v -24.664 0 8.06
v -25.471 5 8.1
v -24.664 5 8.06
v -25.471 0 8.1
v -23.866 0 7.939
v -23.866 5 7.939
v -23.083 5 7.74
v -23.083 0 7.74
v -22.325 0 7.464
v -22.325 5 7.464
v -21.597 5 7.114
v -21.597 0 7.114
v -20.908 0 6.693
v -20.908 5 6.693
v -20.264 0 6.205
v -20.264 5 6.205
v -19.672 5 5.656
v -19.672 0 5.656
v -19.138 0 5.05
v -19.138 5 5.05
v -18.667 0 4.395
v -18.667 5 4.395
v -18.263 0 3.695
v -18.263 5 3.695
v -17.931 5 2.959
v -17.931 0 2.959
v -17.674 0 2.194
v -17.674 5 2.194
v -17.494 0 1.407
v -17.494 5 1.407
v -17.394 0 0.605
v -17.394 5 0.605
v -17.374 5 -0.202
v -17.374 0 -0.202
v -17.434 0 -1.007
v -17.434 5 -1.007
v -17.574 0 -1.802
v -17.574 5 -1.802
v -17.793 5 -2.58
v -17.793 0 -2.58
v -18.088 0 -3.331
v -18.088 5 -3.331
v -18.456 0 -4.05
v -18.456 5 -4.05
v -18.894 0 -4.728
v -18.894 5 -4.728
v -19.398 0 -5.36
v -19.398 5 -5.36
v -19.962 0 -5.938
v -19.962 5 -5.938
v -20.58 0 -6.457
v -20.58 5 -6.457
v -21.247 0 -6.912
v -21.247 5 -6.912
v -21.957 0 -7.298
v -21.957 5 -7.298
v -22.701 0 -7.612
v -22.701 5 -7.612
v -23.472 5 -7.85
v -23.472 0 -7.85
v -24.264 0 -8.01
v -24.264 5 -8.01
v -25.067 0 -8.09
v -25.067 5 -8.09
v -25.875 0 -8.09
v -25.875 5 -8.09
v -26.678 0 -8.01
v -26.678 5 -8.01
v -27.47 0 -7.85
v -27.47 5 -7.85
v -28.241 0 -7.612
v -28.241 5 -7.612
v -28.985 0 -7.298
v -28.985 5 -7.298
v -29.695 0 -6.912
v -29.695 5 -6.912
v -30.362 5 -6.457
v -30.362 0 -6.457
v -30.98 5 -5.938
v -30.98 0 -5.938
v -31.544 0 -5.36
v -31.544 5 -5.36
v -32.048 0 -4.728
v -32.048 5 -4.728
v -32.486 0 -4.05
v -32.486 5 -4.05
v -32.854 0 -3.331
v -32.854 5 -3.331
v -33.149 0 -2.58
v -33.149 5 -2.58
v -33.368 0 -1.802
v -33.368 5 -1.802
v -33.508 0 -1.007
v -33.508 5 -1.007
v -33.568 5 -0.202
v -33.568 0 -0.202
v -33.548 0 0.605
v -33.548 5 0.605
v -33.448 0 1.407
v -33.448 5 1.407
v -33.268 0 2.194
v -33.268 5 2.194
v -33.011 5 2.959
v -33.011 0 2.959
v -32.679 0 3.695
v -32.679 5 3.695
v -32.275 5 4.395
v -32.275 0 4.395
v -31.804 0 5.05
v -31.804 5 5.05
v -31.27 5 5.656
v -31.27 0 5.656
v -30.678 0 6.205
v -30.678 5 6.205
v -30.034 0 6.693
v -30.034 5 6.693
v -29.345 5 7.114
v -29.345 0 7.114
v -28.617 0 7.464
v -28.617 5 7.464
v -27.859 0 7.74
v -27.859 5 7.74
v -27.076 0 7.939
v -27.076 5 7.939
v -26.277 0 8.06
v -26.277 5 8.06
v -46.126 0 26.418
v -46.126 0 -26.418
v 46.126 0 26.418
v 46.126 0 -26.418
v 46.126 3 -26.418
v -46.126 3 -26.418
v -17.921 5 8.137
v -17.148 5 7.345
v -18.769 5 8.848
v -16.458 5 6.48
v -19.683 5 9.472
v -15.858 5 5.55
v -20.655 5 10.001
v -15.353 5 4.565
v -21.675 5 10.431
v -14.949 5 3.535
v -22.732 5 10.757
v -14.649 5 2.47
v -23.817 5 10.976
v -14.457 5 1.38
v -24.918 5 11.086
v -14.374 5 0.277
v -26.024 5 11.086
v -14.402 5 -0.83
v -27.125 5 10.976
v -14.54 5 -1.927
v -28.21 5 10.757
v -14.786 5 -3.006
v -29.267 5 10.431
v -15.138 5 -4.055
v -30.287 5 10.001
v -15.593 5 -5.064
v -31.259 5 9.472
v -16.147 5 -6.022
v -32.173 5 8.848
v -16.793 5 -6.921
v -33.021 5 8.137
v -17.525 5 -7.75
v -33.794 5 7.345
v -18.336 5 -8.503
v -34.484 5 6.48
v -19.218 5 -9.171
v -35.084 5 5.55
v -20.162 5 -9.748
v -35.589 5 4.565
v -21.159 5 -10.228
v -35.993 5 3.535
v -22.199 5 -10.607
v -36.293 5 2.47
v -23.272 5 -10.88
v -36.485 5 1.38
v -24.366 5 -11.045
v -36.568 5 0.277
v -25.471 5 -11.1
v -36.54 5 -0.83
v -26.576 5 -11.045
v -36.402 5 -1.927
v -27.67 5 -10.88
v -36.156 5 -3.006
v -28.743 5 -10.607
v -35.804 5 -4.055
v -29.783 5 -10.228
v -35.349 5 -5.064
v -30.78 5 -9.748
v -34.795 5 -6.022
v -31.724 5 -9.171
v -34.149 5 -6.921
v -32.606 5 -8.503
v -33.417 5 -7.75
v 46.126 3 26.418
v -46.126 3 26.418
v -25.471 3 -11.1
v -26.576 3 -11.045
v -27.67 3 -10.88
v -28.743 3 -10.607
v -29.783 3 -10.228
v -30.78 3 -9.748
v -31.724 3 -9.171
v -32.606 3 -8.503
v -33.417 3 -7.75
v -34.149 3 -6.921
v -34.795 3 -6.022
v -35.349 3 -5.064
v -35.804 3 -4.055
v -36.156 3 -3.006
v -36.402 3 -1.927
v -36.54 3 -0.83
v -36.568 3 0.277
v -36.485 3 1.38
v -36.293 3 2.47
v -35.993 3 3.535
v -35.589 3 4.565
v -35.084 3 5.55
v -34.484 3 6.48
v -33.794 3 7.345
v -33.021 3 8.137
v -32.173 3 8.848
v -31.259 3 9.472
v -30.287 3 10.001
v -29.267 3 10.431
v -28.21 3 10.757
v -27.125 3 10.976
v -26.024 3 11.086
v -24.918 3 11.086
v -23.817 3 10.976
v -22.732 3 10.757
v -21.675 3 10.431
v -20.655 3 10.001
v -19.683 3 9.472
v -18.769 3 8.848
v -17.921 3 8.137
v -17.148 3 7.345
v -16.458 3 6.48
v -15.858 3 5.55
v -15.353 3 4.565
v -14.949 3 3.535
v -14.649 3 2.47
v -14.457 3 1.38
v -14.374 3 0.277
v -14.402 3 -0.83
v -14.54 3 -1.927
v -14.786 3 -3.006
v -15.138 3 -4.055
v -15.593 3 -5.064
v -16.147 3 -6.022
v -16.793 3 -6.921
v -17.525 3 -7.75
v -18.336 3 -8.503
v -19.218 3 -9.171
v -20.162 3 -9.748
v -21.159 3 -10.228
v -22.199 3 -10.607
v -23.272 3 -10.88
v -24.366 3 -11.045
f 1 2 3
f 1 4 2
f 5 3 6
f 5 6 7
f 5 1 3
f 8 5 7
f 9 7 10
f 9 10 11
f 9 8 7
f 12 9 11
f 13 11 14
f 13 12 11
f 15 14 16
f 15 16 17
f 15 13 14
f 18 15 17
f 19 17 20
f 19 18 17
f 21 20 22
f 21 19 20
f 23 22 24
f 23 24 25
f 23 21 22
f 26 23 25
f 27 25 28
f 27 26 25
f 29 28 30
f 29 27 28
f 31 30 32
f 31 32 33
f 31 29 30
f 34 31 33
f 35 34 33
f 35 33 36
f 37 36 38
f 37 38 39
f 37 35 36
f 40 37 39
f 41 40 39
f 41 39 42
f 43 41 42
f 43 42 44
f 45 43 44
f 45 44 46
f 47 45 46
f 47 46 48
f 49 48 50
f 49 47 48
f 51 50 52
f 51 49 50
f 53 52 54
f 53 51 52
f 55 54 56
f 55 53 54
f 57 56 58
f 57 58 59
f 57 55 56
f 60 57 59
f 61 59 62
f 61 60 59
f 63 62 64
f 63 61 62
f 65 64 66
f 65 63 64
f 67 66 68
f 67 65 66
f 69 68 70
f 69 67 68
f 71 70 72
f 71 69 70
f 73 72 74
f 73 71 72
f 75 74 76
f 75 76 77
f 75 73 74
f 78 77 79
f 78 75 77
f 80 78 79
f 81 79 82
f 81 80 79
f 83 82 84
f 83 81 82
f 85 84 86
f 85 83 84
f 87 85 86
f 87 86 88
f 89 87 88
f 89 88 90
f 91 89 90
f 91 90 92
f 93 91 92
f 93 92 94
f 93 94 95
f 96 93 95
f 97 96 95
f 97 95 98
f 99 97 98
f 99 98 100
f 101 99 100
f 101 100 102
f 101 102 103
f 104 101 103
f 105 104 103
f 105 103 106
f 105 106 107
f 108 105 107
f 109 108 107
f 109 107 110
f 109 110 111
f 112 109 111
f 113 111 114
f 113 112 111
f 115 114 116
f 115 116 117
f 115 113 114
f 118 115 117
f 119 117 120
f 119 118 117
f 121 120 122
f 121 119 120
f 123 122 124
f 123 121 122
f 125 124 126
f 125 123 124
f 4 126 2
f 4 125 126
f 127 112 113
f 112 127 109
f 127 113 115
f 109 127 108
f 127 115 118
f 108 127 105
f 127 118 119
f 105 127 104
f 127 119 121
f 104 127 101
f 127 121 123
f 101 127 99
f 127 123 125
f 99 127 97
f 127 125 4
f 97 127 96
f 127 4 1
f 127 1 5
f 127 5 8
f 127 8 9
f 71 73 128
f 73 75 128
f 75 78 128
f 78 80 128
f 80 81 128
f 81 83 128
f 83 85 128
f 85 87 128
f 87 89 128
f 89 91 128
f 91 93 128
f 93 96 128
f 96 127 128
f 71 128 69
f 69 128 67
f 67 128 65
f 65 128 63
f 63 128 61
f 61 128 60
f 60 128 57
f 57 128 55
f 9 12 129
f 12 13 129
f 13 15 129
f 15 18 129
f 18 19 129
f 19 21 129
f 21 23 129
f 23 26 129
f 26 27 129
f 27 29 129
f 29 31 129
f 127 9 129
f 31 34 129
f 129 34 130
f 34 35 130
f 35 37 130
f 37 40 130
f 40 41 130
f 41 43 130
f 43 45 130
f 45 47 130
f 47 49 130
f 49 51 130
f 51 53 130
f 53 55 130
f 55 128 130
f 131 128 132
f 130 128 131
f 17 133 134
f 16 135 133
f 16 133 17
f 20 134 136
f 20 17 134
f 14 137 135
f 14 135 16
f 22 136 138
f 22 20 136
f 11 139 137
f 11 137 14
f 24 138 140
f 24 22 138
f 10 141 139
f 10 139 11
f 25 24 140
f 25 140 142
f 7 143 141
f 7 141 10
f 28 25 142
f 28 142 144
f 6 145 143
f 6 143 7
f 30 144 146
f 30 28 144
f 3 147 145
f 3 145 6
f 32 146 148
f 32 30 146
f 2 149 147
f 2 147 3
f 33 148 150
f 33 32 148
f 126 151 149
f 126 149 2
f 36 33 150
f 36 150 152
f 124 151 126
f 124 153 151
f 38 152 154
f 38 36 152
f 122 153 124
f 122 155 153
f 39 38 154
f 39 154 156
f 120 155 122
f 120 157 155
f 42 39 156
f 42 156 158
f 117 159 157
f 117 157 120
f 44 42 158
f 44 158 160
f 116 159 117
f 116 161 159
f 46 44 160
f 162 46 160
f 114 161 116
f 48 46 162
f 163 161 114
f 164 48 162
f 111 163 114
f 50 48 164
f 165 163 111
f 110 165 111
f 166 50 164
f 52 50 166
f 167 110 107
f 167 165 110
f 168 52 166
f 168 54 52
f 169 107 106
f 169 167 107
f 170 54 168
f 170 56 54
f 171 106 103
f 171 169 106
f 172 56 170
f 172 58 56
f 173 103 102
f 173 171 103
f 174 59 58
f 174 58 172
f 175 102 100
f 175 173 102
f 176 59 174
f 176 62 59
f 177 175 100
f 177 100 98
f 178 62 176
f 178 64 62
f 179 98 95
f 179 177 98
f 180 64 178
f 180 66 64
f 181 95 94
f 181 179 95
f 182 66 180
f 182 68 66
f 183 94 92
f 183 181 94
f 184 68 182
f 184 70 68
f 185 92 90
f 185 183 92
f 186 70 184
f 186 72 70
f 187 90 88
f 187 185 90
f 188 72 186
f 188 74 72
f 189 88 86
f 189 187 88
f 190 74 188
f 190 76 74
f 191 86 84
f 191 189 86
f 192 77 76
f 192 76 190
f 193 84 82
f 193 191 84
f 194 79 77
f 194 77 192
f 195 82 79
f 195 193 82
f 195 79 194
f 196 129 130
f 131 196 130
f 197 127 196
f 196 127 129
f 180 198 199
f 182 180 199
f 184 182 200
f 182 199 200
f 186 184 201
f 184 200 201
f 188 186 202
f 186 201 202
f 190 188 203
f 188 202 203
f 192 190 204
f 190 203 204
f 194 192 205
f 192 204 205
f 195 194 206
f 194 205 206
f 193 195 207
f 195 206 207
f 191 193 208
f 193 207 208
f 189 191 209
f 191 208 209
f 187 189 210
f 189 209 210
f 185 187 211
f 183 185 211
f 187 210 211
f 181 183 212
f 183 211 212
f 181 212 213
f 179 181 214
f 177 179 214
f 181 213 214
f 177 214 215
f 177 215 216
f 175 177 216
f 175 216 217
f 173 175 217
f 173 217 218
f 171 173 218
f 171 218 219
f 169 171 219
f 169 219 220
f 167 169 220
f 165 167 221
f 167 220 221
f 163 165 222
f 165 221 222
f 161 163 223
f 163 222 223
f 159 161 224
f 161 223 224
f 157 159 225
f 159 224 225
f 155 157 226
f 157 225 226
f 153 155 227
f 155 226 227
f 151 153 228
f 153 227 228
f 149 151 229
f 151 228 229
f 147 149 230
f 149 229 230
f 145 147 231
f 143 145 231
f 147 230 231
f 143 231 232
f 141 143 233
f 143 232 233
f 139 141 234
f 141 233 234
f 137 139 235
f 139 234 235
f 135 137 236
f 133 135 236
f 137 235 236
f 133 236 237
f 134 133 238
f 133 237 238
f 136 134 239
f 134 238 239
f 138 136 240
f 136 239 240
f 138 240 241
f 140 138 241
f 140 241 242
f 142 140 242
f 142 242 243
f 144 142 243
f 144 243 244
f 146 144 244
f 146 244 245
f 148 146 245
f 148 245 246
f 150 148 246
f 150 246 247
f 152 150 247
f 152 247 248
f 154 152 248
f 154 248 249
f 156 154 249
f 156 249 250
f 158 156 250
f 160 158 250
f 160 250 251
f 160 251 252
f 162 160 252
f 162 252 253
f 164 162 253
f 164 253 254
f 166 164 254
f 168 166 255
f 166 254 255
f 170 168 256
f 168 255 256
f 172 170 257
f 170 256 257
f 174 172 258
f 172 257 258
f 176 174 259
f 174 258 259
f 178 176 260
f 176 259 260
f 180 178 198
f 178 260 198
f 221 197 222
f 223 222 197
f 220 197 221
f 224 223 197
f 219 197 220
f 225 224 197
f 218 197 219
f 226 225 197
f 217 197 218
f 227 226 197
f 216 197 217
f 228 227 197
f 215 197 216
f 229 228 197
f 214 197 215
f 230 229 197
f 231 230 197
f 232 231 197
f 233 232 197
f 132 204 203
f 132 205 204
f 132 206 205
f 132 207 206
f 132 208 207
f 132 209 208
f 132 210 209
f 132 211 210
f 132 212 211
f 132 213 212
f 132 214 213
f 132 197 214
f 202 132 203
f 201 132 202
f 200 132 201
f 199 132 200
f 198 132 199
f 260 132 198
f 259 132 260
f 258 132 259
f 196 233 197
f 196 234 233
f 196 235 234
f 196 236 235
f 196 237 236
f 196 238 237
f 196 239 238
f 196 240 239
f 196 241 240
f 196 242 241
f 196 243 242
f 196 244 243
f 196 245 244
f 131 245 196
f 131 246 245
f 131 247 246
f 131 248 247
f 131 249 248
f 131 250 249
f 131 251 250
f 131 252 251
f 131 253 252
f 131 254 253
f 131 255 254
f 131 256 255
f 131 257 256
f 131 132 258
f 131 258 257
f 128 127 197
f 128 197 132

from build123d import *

# Parameters (mm, degrees)
SKETCH1_W           = 92.252714028
SKETCH1_H           = 52.835645306
SKETCH1_R           = 8.1
BOSS_EXTRUDE1_DEPTH = 3
SKETCH2_R           = 11.1
SKETCH2_R_2         = 8.1
BOSS_EXTRUDE2_DEPTH = 2


with BuildPart() as part:
    # Sketch1 → Boss-Extrude1 (new body)
    with BuildSketch(Plane(origin=(0, 0, 0), x_dir=(1, 0, 0), z_dir=(0, 1, 0))):
        Rectangle(SKETCH1_W, SKETCH1_H)
        with Locations(Location((-25.470998192, 0, 0), (0, 0, 270))):
            Circle(SKETCH1_R, mode=Mode.SUBTRACT)
    extrude(amount=BOSS_EXTRUDE1_DEPTH)

    # Sketch2 → Boss-Extrude2 (add)
    with BuildSketch(Plane(origin=(0, 3, 0), x_dir=(1, 0, 0), z_dir=(0, 1, 0))):
        with Locations(Location((-25.470998192, 0, 0), (0, 0, 90))):
            Circle(SKETCH2_R)
        with Locations(Location((-25.470998192, 0, 0), (0, 0, 270))):
            Circle(SKETCH2_R_2, mode=Mode.SUBTRACT)
    extrude(amount=BOSS_EXTRUDE2_DEPTH)


solid = part.part
